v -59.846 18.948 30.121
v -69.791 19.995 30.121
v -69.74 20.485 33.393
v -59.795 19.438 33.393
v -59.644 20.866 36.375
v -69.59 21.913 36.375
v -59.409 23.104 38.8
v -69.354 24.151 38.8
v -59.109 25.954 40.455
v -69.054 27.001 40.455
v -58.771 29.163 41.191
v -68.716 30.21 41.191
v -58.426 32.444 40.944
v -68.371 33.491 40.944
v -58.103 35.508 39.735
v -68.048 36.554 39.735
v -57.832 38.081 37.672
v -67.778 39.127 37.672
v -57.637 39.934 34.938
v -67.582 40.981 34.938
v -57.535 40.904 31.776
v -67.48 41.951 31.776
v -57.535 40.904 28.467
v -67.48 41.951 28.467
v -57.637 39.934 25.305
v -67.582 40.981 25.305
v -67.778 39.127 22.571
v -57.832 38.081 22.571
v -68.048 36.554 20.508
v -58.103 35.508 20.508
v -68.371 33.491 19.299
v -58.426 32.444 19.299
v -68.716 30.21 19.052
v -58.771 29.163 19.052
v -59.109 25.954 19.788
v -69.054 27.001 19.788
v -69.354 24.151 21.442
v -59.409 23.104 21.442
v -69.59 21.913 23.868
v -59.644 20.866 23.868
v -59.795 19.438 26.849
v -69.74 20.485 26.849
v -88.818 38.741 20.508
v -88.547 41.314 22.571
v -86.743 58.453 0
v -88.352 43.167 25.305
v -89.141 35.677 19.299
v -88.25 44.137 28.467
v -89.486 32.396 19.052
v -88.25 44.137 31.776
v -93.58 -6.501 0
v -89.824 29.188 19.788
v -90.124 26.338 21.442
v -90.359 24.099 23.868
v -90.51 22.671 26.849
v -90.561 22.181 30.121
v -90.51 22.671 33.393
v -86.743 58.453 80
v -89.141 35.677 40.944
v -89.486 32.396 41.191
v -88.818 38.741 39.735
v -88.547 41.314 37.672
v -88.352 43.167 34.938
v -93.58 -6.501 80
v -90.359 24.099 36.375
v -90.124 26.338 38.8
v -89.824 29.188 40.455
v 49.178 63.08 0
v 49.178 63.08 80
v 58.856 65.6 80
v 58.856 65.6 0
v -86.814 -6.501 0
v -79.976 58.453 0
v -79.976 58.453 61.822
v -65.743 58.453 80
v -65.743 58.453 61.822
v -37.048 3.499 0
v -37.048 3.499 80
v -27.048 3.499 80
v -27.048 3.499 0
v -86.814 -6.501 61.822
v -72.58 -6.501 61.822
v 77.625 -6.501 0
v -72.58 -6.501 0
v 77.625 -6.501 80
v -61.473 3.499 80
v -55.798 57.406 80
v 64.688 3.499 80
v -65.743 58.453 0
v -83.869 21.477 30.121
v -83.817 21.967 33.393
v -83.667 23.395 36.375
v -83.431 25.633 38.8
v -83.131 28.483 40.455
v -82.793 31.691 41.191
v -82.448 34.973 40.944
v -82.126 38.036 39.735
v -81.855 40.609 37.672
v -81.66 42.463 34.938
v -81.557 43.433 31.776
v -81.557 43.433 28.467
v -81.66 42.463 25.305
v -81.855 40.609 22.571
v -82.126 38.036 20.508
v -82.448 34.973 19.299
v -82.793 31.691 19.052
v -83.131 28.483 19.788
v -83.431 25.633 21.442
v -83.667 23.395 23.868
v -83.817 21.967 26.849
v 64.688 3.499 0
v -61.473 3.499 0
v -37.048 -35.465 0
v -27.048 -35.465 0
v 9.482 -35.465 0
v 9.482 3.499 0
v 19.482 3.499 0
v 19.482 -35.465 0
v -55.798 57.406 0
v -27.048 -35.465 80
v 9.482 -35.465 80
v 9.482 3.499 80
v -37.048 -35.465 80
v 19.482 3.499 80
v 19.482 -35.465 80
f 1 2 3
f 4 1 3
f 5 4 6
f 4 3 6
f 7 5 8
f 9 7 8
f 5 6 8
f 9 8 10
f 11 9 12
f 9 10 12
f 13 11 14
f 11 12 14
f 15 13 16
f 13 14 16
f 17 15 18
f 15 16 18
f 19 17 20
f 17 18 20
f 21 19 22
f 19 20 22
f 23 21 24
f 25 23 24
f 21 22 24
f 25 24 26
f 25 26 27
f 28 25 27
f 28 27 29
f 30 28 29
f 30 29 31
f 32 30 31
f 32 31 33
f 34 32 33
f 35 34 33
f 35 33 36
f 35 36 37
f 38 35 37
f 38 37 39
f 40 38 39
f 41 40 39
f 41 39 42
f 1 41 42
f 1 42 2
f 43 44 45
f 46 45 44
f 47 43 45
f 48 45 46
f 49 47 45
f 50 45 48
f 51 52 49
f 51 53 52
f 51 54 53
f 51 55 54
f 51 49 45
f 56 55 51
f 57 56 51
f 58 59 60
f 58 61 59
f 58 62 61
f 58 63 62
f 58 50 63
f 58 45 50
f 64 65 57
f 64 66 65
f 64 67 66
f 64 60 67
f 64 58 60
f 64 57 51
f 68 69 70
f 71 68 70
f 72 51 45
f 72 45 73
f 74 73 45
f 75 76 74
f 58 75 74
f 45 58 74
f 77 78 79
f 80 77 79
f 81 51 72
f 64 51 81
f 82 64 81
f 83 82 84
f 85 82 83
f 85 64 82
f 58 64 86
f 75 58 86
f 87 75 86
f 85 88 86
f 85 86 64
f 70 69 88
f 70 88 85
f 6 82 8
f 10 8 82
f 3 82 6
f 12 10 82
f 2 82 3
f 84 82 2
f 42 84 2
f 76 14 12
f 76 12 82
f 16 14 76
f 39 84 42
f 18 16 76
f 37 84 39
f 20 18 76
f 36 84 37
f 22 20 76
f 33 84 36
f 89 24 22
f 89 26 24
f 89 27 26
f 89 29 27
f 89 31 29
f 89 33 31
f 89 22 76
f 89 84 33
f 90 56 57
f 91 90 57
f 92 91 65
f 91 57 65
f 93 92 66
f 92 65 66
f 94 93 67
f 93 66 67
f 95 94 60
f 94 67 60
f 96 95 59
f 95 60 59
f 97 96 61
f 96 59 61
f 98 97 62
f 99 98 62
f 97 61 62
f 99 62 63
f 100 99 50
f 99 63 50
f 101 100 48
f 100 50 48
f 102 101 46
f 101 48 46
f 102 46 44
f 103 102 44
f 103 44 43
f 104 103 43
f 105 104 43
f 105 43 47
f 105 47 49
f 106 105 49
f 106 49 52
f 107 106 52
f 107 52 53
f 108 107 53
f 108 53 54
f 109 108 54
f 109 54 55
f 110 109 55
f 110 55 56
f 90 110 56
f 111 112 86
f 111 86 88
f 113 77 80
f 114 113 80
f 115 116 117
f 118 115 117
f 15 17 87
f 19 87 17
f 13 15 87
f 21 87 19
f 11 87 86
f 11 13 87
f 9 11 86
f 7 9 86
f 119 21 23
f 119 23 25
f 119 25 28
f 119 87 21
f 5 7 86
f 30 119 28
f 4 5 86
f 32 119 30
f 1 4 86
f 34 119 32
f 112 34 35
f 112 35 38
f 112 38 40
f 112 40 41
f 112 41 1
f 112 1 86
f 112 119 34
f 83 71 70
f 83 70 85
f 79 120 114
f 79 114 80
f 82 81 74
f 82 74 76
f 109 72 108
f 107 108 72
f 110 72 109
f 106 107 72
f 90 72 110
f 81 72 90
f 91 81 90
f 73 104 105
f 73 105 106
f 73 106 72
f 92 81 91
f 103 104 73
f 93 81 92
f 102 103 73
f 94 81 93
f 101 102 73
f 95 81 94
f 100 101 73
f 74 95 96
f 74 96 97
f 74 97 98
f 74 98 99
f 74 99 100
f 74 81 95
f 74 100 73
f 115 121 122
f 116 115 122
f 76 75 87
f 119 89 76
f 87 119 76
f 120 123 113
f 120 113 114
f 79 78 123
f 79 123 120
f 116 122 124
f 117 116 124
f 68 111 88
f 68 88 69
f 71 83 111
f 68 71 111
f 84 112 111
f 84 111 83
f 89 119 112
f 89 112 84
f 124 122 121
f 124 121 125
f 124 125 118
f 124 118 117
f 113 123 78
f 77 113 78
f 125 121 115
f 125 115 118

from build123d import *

# Parameters (mm, degrees)
EXTRUDE_THIN1_DEPTH   = 80
SKETCH1_W             = 10
SKETCH1_H             = 38.964166073
EXTRUDE_THIN1_2_DEPTH = 80
EXTRUDE_THIN1_3_DEPTH = 80
BOSS_EXTRUDE1_START   = 61.822225992
BOSS_EXTRUDE1_DEPTH   = 18.177774008
BOSS_EXTRUDE2_DEPTH   = 61.822225992
SKETCH4_R             = 11.100851837
CUT_EXTRUDE1_DEPTH    = 41


# Read off the part's stored shape, not the designer's step: Boss-Extrude1
with BuildPart() as part:
    # Sketch1 → Extrude-Thin1 (new body)
    with BuildSketch(Plane.XY):
        Polygon((-55.798198988, 57.405943705), (-61.472592106, 3.499209089), (64.688081539, 3.499209089), (49.178073684, 63.080336822), (58.855550127, 65.599552912), (77.624528519, -6.500790911), (-72.580472724, -6.500790911), (-65.743253517, 58.45279155), align=None)
    extrude(amount=EXTRUDE_THIN1_DEPTH)

    # Boss-Extrude1 outline → Boss-Extrude1 (add)
    with BuildSketch(Plane.XY.offset(BOSS_EXTRUDE1_START)):
        Polygon((-93.580472724, -6.500790911), (-72.580472724, -6.500790911), (-65.743253517, 58.45279155), (-86.743253517, 58.45279155), align=None)
    extrude(amount=BOSS_EXTRUDE1_DEPTH)

    # Sketch3 → Boss-Extrude2 (add)
    with BuildSketch(Plane(origin=(0, 0, 61.822225992), x_dir=(-1, 0, 0), z_dir=(0, 0, -1))):
        Polygon((93.580472724, -6.500790911), (86.813662715, -6.500790911), (79.976443509, 58.45279155), (86.743253517, 58.45279155), align=None)
    extrude(amount=BOSS_EXTRUDE2_DEPTH)

    # Sketch4 → Cut-Extrude1 (cut)
    with BuildSketch(Plane(origin=(-91.878138626, 9.671383013, 0), x_dir=(0, 0, 1), z_dir=(-0.994505452921406, 0.10468478451804275, 0))):
        with Locations(Location((30.121319387, 23.679594918, 0), (0, 0, 270))):
            Circle(SKETCH4_R)
    extrude(amount=-CUT_EXTRUDE1_DEPTH, mode=Mode.SUBTRACT)


with BuildPart() as body_2:
    # Sketch1 → Extrude-Thin1 2 (new body)
    with BuildSketch(Plane.XY):
        with Locations((-32.047940526, -15.982873948)):
            Rectangle(SKETCH1_W, SKETCH1_H)
    extrude(amount=EXTRUDE_THIN1_2_DEPTH)


with BuildPart() as body_3:
    # Sketch1 → Extrude-Thin1 3 (new body)
    with BuildSketch(Plane.XY):
        with Locations((14.482083037, -15.982873948)):
            Rectangle(SKETCH1_W, SKETCH1_H)
    extrude(amount=EXTRUDE_THIN1_3_DEPTH)


solid = Compound([part.part, body_2.part, body_3.part])
